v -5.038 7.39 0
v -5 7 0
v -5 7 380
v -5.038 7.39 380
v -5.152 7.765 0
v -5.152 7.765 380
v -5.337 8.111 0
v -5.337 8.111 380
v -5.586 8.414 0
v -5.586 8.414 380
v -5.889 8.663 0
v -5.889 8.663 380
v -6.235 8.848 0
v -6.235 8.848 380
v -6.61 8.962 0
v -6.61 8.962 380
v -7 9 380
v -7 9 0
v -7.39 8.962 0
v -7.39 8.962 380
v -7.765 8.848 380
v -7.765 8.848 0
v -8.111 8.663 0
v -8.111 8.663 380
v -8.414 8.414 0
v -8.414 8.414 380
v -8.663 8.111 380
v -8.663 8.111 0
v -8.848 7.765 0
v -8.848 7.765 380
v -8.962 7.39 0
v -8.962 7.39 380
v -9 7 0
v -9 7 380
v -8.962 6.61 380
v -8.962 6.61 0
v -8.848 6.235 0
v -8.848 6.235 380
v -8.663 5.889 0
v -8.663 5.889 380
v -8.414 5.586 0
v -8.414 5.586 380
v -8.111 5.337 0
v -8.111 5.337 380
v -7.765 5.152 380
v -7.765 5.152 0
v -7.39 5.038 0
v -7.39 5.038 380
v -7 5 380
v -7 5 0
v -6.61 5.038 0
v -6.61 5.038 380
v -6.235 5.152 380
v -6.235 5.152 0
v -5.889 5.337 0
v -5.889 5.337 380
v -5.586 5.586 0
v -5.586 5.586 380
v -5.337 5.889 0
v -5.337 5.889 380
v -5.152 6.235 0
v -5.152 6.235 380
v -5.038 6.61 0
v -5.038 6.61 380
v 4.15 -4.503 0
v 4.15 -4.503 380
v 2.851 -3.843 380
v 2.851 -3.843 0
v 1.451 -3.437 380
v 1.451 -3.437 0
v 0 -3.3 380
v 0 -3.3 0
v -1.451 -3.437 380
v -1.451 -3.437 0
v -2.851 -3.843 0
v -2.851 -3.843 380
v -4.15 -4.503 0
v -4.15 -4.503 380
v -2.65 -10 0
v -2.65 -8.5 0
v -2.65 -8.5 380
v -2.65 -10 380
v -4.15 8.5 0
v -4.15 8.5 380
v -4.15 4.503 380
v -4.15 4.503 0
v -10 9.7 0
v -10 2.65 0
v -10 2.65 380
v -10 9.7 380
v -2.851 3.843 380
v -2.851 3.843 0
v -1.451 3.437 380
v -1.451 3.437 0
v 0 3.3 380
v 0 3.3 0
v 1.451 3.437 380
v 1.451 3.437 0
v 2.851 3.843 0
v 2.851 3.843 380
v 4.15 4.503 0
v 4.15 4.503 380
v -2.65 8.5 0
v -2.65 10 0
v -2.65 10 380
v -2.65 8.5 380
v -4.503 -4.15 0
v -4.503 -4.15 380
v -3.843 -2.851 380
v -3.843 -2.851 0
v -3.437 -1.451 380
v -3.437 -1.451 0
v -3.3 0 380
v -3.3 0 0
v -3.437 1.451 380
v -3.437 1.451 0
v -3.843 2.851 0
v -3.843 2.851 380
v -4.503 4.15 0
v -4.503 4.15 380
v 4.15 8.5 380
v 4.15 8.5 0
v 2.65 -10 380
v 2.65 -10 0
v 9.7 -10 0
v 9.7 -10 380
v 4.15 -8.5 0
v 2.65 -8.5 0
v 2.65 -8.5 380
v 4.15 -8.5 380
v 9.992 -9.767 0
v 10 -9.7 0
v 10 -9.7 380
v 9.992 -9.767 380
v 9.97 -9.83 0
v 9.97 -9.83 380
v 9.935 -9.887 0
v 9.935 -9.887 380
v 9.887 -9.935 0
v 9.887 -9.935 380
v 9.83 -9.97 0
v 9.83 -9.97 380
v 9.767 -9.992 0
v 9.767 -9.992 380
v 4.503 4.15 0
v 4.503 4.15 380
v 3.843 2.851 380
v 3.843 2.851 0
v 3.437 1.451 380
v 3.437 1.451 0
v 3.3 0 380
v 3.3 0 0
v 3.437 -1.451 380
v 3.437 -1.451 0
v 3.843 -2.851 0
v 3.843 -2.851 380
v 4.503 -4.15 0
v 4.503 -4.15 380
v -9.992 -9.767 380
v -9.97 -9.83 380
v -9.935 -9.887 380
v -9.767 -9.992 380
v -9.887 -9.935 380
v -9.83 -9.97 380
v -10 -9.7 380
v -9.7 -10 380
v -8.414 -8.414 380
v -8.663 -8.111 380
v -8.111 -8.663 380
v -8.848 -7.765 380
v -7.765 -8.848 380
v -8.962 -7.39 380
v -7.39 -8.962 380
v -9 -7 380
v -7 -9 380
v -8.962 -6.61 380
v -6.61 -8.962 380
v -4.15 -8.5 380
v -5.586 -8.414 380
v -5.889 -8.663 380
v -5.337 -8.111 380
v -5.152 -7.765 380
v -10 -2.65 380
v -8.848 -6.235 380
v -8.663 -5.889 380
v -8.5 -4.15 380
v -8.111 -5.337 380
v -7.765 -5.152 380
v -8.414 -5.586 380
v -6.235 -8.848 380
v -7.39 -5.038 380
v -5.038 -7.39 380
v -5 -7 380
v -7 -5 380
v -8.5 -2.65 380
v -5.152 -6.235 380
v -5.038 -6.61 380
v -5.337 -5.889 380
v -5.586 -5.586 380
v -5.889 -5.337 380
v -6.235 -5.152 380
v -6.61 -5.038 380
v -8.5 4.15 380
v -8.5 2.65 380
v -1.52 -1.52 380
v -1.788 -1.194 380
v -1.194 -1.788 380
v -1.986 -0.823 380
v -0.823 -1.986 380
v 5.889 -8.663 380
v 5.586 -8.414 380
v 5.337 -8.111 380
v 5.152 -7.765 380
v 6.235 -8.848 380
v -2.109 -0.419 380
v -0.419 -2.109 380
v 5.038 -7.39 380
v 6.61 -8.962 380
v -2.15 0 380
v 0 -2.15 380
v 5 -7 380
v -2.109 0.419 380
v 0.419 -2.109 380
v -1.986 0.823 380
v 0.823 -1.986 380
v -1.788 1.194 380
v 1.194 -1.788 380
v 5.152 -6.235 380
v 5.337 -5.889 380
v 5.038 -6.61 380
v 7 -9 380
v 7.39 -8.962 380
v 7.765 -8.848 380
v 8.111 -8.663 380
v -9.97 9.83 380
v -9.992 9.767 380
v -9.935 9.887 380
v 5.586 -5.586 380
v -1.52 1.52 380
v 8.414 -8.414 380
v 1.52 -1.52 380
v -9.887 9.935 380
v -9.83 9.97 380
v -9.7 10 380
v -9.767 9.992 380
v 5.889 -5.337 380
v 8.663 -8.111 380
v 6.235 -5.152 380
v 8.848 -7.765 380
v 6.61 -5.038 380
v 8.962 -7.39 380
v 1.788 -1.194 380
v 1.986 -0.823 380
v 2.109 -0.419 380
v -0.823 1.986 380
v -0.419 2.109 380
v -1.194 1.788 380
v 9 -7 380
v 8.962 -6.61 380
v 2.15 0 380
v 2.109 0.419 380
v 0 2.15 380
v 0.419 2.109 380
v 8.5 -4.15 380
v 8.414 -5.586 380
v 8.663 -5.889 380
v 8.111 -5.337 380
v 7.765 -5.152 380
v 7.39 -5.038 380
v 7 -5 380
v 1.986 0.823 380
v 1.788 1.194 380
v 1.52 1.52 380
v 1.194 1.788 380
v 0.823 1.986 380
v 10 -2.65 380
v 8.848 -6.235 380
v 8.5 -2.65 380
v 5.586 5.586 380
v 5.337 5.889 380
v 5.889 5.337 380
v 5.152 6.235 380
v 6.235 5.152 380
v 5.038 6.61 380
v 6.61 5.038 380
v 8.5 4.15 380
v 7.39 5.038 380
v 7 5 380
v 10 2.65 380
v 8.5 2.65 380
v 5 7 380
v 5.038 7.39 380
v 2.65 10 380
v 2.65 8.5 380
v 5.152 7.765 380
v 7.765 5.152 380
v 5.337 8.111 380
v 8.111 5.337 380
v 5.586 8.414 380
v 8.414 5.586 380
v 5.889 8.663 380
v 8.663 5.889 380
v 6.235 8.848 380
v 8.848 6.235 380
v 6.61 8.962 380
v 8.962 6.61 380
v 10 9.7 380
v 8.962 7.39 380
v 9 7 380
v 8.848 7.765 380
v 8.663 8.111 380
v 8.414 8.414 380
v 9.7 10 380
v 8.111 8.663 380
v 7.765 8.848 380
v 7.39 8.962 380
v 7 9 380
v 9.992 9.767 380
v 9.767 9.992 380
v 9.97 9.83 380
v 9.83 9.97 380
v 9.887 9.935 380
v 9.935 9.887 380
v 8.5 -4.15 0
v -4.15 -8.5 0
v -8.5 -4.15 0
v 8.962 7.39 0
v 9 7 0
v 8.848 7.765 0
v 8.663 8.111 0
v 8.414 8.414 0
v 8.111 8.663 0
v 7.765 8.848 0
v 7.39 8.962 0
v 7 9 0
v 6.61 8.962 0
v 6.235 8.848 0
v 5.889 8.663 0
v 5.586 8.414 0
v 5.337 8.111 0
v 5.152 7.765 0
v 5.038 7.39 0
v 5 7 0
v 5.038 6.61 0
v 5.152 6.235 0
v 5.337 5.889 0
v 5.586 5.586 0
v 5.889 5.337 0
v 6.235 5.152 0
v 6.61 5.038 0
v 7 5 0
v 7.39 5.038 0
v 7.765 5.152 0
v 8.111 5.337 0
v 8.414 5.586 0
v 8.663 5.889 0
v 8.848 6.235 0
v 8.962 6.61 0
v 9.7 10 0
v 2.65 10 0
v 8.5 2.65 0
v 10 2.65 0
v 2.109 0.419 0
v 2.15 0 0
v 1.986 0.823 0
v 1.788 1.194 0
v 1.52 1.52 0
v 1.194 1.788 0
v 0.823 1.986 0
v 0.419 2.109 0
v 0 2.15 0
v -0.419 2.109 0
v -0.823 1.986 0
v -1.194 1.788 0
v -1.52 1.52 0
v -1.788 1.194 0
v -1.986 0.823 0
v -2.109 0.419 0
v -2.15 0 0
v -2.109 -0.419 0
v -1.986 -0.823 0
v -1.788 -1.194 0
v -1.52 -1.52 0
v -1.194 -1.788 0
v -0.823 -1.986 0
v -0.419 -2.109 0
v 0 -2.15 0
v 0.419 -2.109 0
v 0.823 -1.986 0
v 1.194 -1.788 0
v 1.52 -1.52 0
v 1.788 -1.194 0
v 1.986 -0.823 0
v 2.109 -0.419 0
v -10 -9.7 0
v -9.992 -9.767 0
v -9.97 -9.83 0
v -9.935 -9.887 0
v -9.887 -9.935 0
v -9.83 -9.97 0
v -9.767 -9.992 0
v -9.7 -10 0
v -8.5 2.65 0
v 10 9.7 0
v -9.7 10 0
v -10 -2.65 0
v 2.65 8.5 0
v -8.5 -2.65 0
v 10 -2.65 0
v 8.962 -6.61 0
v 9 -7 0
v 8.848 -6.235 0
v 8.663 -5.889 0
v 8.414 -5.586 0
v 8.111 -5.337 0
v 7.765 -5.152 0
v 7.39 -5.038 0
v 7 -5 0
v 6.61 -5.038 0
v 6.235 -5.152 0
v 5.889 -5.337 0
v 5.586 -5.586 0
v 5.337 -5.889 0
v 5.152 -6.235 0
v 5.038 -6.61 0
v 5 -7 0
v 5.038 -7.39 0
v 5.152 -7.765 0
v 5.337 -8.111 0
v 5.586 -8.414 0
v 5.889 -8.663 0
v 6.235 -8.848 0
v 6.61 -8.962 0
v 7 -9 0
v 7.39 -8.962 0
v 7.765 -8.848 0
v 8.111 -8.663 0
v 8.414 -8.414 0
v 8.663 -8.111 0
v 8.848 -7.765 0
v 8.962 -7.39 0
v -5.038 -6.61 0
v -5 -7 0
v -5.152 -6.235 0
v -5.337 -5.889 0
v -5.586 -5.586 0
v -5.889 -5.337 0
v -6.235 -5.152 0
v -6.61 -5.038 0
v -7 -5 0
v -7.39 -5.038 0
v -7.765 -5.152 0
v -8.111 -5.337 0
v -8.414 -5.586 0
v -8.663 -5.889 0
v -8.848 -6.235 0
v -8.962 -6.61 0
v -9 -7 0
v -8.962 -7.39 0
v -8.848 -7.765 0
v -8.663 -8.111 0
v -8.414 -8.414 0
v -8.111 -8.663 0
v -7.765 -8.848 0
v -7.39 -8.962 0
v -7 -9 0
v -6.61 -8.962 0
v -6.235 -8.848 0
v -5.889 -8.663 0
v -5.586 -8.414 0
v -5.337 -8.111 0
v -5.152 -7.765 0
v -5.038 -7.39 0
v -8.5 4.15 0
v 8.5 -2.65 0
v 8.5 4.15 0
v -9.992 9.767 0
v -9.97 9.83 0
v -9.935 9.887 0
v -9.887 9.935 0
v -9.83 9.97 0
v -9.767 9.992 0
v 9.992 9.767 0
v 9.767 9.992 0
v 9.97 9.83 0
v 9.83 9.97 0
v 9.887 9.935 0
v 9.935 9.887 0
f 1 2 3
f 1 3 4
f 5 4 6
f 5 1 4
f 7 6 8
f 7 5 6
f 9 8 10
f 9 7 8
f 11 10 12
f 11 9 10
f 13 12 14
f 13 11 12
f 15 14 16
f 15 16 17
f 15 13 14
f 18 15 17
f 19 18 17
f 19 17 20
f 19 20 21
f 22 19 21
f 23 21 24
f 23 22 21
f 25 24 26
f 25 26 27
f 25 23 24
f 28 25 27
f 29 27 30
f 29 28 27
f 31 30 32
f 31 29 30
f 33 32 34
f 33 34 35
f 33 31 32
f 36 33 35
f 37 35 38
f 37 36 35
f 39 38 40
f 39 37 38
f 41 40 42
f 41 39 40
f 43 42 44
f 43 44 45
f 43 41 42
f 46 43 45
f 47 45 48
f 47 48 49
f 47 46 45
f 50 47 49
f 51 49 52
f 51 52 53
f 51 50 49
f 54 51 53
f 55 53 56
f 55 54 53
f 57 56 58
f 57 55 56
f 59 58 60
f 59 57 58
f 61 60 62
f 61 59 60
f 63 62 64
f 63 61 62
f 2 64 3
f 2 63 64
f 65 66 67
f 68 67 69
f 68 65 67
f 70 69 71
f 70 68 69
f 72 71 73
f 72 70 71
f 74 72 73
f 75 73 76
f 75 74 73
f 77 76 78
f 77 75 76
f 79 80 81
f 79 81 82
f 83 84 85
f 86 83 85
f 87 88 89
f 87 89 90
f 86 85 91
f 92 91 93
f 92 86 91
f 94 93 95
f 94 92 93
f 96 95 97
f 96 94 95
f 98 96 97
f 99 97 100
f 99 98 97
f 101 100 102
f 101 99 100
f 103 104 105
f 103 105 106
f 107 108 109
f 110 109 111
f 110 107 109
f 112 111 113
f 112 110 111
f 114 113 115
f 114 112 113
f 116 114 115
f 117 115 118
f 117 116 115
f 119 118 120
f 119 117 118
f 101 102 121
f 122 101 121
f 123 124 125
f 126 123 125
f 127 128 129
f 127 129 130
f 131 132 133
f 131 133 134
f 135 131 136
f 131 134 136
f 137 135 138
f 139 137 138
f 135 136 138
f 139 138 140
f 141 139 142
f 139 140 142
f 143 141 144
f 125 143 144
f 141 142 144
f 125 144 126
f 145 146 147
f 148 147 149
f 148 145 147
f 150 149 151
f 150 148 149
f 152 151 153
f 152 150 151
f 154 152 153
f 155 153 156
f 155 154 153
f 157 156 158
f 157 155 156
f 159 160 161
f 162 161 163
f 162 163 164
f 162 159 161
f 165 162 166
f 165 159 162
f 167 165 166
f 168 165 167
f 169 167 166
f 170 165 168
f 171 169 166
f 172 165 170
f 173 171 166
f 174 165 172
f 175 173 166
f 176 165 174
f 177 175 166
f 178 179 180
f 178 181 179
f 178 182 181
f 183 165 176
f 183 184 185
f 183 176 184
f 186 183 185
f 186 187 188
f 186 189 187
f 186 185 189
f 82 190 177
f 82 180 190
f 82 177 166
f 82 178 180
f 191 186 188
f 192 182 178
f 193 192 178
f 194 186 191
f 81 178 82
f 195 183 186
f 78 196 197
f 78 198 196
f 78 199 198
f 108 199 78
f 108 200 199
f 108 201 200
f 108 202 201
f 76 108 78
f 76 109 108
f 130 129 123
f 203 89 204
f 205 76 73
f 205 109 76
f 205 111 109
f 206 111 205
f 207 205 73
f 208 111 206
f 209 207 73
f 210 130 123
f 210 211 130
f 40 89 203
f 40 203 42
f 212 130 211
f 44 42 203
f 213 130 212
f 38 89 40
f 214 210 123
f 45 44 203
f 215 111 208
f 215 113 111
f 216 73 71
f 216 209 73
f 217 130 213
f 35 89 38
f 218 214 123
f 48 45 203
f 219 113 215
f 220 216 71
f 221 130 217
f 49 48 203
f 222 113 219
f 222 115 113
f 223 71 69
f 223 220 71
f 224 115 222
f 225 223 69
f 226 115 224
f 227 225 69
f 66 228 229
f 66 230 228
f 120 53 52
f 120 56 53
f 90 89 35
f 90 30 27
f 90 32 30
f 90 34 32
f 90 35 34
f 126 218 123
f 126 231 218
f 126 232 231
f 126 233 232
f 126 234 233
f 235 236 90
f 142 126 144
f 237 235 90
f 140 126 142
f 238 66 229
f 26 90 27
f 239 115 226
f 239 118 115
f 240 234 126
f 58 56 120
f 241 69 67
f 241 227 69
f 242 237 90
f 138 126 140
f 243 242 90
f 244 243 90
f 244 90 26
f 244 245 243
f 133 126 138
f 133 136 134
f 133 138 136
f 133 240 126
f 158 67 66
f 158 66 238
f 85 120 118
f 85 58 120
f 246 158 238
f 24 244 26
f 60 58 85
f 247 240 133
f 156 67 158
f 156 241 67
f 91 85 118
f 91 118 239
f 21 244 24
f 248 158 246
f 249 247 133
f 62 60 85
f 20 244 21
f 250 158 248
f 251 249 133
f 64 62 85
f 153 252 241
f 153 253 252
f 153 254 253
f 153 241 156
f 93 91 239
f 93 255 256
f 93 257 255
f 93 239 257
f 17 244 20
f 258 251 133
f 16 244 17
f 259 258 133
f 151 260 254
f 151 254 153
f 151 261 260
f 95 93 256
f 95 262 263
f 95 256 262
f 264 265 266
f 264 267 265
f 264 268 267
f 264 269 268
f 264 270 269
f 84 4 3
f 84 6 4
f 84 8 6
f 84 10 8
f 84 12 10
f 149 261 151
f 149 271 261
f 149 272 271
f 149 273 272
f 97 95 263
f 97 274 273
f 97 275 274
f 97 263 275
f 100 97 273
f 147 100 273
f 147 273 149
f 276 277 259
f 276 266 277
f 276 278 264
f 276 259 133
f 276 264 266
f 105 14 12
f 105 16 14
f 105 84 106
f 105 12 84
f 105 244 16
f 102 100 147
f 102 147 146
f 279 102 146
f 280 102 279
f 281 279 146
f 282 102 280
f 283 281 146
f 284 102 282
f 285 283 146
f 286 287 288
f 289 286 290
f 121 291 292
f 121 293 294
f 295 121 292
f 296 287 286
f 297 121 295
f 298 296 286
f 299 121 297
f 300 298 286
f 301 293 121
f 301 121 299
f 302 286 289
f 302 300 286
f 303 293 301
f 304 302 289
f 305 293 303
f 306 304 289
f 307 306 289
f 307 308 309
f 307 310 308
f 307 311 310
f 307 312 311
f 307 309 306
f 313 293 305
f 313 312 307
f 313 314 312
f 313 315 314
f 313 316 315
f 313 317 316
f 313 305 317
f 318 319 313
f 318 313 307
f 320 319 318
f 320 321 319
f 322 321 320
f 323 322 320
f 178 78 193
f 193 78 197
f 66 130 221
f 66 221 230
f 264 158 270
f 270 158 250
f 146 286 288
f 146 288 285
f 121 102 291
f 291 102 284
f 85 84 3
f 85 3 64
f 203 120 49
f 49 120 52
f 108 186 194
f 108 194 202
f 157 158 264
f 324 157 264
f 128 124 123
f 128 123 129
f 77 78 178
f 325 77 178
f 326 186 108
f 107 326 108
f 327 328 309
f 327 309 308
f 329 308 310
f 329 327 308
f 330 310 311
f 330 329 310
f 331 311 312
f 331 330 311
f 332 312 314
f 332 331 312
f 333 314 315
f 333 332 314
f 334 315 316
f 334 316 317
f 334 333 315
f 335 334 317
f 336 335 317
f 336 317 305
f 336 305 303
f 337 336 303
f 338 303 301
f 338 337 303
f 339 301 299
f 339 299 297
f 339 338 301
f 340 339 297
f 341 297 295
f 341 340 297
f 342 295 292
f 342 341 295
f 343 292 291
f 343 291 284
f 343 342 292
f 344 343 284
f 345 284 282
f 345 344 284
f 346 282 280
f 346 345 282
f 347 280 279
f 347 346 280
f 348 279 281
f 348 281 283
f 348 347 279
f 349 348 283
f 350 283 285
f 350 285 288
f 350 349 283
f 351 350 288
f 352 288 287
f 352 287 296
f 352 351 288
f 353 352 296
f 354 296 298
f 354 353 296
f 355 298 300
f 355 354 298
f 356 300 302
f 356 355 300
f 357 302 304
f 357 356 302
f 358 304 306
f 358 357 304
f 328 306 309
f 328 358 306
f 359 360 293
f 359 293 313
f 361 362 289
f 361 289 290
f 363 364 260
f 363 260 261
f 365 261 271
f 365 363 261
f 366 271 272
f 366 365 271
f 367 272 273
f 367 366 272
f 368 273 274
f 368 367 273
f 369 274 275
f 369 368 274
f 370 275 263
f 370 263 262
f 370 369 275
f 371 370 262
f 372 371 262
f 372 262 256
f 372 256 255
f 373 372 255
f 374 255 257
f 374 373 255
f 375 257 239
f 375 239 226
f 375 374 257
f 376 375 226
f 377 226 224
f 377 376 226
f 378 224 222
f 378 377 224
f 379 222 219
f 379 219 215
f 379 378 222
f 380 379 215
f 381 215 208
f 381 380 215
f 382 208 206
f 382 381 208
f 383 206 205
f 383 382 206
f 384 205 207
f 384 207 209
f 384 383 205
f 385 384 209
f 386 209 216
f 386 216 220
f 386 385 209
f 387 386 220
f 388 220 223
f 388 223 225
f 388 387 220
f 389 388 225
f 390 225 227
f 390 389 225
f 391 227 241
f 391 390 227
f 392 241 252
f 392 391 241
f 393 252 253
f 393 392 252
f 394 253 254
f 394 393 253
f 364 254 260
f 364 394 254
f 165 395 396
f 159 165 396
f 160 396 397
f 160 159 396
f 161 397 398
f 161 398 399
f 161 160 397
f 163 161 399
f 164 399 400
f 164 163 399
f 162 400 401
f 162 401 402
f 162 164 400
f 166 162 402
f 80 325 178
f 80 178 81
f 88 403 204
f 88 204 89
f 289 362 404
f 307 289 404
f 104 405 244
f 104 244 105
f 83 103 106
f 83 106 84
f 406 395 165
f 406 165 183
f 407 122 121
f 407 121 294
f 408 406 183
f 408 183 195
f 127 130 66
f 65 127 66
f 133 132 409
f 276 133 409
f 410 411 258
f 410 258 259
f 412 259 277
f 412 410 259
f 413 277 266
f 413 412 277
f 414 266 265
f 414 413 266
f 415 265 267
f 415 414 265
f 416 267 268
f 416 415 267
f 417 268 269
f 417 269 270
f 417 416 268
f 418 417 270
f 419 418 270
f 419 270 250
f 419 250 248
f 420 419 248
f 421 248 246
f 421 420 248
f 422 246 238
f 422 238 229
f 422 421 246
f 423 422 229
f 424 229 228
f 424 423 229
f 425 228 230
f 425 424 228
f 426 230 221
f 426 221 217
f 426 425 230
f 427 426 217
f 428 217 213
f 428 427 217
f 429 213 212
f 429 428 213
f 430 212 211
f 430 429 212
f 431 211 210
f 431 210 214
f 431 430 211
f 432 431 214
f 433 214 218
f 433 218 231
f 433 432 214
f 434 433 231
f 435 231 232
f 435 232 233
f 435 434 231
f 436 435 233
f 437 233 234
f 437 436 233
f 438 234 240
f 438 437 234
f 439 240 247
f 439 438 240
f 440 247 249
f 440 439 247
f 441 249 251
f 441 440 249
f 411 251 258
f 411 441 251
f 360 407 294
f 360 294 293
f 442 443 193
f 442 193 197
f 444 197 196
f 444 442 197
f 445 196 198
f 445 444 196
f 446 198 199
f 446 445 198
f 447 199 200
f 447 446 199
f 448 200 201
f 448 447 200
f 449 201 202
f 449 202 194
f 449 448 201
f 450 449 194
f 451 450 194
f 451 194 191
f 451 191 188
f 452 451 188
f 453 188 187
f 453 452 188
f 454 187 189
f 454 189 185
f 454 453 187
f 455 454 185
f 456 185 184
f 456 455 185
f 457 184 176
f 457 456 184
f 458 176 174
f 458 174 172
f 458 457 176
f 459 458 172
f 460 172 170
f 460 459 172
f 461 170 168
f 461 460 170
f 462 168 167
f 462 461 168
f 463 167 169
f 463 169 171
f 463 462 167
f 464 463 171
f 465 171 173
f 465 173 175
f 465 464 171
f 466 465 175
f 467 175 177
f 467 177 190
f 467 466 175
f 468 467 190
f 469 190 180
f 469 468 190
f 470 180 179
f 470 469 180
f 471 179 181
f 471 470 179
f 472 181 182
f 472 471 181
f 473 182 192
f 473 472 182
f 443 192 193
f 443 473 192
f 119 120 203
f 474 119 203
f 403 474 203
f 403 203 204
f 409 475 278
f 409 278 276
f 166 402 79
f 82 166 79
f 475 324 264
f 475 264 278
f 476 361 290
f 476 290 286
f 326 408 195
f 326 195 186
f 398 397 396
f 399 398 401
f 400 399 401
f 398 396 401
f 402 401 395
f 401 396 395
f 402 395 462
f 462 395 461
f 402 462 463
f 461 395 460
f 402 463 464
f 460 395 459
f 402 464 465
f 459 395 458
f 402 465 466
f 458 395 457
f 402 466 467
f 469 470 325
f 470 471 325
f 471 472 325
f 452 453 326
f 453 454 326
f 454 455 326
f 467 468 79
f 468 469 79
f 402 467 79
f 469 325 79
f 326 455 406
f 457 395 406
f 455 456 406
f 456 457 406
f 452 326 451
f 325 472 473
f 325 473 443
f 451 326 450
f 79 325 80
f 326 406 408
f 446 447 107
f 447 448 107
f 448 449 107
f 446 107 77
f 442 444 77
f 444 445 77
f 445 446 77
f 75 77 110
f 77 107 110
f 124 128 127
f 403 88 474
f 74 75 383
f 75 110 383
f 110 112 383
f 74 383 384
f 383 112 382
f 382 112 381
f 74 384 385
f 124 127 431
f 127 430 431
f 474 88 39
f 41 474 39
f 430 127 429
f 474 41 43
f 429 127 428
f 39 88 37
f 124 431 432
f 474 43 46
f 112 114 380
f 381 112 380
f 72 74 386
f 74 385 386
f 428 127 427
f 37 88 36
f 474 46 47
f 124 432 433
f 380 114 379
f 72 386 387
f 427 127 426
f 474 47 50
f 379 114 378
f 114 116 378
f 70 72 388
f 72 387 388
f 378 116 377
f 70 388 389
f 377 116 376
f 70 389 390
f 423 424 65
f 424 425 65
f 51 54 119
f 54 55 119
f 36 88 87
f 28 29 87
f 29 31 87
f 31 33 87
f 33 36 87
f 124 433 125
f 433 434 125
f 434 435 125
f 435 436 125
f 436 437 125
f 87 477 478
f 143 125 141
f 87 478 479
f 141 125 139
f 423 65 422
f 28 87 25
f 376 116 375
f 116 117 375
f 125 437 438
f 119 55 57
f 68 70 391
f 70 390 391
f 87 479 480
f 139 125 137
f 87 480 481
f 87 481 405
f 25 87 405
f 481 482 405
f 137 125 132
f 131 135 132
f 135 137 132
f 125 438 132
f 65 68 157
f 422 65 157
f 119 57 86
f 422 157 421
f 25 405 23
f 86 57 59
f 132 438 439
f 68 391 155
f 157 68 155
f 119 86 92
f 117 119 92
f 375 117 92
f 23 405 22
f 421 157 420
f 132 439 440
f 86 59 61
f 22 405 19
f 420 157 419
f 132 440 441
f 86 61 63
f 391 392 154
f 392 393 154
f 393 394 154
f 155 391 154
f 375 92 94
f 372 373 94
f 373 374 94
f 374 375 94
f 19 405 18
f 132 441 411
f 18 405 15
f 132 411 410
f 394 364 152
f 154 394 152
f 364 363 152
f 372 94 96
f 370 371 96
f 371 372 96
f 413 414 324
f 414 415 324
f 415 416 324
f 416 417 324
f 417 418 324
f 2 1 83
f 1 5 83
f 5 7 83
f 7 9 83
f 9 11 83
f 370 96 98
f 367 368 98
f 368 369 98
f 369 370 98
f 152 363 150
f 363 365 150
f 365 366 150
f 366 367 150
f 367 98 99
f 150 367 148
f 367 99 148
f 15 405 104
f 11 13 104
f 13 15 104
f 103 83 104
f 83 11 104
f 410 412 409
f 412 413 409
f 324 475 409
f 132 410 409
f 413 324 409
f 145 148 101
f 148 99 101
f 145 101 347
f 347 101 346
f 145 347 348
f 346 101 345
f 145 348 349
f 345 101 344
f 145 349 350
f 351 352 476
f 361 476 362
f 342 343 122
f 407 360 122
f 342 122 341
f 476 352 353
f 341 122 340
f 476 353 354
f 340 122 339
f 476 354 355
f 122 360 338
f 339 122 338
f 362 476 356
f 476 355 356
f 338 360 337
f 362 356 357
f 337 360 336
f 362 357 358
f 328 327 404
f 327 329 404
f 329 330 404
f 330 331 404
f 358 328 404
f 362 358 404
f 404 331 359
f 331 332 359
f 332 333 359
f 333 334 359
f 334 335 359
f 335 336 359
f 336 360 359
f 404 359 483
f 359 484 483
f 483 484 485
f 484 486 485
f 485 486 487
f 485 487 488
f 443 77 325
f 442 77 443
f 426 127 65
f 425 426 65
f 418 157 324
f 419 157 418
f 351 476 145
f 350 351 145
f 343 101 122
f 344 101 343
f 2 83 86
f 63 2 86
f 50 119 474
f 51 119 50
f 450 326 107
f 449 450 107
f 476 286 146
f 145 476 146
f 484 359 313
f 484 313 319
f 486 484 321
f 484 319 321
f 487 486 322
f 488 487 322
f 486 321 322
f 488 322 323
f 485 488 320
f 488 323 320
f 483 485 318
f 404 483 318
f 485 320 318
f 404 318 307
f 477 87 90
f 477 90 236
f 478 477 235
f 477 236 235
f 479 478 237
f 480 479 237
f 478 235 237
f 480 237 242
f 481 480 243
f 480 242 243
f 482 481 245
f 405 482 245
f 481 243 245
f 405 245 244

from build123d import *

# Parameters (mm, degrees)
SKETCH_1_W               = 20
SKETCH_1_H               = 20
SKETCH_1_R               = 2
SKETCH_1_R_2             = 2.15
EXTRUDE_1_DEPTH          = 380
CUT_EXTRUDE_1_REACH      = 382.263
PATTERN_CIRCULAR_1_COUNT = 4
FILLET_1_R               = 0.3


with BuildPart() as part:
    # 스케치1 → 보스-돌출1 (new body)
    with BuildSketch(Plane.XY):
        Rectangle(SKETCH_1_W, SKETCH_1_H)
        with Locations((-7, -7)):
            Circle(SKETCH_1_R, mode=Mode.SUBTRACT)
        with Locations((7, -7)):
            Circle(SKETCH_1_R, mode=Mode.SUBTRACT)
        with Locations((-7, 7)):
            Circle(SKETCH_1_R, mode=Mode.SUBTRACT)
        Circle(SKETCH_1_R_2, mode=Mode.SUBTRACT)
        with Locations((7, 7)):
            Circle(SKETCH_1_R, mode=Mode.SUBTRACT)
    extrude(amount=EXTRUDE_1_DEPTH)

    # 스케치1<3> → 컷-돌출1 (cut, up to next)
    with BuildSketch(Plane.XY, mode=Mode.PRIVATE) as cut_extrude_1_sk1:
        with BuildLine():
            Line((-8.5, 2.65), (-10, 2.65))
            Line((-10, 2.65), (-10, -2.65))
            Line((-10, -2.65), (-8.5, -2.65))
            Line((-8.5, -2.65), (-8.5, -4.15))
            Line((-8.5, -4.15), (-4.503166667, -4.15))
            ThreePointArc((-4.503166667, -4.15), (-3.3, 0), (-4.503166667, 4.15))
            Line((-4.503166667, 4.15), (-8.5, 4.15))
            Line((-8.5, 4.15), (-8.5, 2.65))
        make_face()
    cut_extrude_1_tool1 = extrude(cut_extrude_1_sk1.sketch, amount=CUT_EXTRUDE_1_REACH, mode=Mode.PRIVATE) & part.part
    cut_extrude_1 = cut_extrude_1_tool1.solids().sort_by_distance((-6.606913, 0, 0))[0]
    add(cut_extrude_1, mode=Mode.SUBTRACT)

    # 원형 패턴1: 컷-돌출1 ×4 about axis
    pattern_circular_1_axis = Axis((0, 0, 380), (0, 0, -1))
    for i in range(1, PATTERN_CIRCULAR_1_COUNT):
        add(cut_extrude_1.rotate(pattern_circular_1_axis, i * 360 / PATTERN_CIRCULAR_1_COUNT), mode=Mode.SUBTRACT)

    # 필렛1
    fillet_1_edges = [part.edges().sort_by_distance(p)[0] for p in [
        (10, -10, 190),
        (-10, -10, 190),
        (-10, 10, 190),
        (10, 10, 190),
    ]]
    fillet(fillet_1_edges, radius=FILLET_1_R)


solid = part.part
